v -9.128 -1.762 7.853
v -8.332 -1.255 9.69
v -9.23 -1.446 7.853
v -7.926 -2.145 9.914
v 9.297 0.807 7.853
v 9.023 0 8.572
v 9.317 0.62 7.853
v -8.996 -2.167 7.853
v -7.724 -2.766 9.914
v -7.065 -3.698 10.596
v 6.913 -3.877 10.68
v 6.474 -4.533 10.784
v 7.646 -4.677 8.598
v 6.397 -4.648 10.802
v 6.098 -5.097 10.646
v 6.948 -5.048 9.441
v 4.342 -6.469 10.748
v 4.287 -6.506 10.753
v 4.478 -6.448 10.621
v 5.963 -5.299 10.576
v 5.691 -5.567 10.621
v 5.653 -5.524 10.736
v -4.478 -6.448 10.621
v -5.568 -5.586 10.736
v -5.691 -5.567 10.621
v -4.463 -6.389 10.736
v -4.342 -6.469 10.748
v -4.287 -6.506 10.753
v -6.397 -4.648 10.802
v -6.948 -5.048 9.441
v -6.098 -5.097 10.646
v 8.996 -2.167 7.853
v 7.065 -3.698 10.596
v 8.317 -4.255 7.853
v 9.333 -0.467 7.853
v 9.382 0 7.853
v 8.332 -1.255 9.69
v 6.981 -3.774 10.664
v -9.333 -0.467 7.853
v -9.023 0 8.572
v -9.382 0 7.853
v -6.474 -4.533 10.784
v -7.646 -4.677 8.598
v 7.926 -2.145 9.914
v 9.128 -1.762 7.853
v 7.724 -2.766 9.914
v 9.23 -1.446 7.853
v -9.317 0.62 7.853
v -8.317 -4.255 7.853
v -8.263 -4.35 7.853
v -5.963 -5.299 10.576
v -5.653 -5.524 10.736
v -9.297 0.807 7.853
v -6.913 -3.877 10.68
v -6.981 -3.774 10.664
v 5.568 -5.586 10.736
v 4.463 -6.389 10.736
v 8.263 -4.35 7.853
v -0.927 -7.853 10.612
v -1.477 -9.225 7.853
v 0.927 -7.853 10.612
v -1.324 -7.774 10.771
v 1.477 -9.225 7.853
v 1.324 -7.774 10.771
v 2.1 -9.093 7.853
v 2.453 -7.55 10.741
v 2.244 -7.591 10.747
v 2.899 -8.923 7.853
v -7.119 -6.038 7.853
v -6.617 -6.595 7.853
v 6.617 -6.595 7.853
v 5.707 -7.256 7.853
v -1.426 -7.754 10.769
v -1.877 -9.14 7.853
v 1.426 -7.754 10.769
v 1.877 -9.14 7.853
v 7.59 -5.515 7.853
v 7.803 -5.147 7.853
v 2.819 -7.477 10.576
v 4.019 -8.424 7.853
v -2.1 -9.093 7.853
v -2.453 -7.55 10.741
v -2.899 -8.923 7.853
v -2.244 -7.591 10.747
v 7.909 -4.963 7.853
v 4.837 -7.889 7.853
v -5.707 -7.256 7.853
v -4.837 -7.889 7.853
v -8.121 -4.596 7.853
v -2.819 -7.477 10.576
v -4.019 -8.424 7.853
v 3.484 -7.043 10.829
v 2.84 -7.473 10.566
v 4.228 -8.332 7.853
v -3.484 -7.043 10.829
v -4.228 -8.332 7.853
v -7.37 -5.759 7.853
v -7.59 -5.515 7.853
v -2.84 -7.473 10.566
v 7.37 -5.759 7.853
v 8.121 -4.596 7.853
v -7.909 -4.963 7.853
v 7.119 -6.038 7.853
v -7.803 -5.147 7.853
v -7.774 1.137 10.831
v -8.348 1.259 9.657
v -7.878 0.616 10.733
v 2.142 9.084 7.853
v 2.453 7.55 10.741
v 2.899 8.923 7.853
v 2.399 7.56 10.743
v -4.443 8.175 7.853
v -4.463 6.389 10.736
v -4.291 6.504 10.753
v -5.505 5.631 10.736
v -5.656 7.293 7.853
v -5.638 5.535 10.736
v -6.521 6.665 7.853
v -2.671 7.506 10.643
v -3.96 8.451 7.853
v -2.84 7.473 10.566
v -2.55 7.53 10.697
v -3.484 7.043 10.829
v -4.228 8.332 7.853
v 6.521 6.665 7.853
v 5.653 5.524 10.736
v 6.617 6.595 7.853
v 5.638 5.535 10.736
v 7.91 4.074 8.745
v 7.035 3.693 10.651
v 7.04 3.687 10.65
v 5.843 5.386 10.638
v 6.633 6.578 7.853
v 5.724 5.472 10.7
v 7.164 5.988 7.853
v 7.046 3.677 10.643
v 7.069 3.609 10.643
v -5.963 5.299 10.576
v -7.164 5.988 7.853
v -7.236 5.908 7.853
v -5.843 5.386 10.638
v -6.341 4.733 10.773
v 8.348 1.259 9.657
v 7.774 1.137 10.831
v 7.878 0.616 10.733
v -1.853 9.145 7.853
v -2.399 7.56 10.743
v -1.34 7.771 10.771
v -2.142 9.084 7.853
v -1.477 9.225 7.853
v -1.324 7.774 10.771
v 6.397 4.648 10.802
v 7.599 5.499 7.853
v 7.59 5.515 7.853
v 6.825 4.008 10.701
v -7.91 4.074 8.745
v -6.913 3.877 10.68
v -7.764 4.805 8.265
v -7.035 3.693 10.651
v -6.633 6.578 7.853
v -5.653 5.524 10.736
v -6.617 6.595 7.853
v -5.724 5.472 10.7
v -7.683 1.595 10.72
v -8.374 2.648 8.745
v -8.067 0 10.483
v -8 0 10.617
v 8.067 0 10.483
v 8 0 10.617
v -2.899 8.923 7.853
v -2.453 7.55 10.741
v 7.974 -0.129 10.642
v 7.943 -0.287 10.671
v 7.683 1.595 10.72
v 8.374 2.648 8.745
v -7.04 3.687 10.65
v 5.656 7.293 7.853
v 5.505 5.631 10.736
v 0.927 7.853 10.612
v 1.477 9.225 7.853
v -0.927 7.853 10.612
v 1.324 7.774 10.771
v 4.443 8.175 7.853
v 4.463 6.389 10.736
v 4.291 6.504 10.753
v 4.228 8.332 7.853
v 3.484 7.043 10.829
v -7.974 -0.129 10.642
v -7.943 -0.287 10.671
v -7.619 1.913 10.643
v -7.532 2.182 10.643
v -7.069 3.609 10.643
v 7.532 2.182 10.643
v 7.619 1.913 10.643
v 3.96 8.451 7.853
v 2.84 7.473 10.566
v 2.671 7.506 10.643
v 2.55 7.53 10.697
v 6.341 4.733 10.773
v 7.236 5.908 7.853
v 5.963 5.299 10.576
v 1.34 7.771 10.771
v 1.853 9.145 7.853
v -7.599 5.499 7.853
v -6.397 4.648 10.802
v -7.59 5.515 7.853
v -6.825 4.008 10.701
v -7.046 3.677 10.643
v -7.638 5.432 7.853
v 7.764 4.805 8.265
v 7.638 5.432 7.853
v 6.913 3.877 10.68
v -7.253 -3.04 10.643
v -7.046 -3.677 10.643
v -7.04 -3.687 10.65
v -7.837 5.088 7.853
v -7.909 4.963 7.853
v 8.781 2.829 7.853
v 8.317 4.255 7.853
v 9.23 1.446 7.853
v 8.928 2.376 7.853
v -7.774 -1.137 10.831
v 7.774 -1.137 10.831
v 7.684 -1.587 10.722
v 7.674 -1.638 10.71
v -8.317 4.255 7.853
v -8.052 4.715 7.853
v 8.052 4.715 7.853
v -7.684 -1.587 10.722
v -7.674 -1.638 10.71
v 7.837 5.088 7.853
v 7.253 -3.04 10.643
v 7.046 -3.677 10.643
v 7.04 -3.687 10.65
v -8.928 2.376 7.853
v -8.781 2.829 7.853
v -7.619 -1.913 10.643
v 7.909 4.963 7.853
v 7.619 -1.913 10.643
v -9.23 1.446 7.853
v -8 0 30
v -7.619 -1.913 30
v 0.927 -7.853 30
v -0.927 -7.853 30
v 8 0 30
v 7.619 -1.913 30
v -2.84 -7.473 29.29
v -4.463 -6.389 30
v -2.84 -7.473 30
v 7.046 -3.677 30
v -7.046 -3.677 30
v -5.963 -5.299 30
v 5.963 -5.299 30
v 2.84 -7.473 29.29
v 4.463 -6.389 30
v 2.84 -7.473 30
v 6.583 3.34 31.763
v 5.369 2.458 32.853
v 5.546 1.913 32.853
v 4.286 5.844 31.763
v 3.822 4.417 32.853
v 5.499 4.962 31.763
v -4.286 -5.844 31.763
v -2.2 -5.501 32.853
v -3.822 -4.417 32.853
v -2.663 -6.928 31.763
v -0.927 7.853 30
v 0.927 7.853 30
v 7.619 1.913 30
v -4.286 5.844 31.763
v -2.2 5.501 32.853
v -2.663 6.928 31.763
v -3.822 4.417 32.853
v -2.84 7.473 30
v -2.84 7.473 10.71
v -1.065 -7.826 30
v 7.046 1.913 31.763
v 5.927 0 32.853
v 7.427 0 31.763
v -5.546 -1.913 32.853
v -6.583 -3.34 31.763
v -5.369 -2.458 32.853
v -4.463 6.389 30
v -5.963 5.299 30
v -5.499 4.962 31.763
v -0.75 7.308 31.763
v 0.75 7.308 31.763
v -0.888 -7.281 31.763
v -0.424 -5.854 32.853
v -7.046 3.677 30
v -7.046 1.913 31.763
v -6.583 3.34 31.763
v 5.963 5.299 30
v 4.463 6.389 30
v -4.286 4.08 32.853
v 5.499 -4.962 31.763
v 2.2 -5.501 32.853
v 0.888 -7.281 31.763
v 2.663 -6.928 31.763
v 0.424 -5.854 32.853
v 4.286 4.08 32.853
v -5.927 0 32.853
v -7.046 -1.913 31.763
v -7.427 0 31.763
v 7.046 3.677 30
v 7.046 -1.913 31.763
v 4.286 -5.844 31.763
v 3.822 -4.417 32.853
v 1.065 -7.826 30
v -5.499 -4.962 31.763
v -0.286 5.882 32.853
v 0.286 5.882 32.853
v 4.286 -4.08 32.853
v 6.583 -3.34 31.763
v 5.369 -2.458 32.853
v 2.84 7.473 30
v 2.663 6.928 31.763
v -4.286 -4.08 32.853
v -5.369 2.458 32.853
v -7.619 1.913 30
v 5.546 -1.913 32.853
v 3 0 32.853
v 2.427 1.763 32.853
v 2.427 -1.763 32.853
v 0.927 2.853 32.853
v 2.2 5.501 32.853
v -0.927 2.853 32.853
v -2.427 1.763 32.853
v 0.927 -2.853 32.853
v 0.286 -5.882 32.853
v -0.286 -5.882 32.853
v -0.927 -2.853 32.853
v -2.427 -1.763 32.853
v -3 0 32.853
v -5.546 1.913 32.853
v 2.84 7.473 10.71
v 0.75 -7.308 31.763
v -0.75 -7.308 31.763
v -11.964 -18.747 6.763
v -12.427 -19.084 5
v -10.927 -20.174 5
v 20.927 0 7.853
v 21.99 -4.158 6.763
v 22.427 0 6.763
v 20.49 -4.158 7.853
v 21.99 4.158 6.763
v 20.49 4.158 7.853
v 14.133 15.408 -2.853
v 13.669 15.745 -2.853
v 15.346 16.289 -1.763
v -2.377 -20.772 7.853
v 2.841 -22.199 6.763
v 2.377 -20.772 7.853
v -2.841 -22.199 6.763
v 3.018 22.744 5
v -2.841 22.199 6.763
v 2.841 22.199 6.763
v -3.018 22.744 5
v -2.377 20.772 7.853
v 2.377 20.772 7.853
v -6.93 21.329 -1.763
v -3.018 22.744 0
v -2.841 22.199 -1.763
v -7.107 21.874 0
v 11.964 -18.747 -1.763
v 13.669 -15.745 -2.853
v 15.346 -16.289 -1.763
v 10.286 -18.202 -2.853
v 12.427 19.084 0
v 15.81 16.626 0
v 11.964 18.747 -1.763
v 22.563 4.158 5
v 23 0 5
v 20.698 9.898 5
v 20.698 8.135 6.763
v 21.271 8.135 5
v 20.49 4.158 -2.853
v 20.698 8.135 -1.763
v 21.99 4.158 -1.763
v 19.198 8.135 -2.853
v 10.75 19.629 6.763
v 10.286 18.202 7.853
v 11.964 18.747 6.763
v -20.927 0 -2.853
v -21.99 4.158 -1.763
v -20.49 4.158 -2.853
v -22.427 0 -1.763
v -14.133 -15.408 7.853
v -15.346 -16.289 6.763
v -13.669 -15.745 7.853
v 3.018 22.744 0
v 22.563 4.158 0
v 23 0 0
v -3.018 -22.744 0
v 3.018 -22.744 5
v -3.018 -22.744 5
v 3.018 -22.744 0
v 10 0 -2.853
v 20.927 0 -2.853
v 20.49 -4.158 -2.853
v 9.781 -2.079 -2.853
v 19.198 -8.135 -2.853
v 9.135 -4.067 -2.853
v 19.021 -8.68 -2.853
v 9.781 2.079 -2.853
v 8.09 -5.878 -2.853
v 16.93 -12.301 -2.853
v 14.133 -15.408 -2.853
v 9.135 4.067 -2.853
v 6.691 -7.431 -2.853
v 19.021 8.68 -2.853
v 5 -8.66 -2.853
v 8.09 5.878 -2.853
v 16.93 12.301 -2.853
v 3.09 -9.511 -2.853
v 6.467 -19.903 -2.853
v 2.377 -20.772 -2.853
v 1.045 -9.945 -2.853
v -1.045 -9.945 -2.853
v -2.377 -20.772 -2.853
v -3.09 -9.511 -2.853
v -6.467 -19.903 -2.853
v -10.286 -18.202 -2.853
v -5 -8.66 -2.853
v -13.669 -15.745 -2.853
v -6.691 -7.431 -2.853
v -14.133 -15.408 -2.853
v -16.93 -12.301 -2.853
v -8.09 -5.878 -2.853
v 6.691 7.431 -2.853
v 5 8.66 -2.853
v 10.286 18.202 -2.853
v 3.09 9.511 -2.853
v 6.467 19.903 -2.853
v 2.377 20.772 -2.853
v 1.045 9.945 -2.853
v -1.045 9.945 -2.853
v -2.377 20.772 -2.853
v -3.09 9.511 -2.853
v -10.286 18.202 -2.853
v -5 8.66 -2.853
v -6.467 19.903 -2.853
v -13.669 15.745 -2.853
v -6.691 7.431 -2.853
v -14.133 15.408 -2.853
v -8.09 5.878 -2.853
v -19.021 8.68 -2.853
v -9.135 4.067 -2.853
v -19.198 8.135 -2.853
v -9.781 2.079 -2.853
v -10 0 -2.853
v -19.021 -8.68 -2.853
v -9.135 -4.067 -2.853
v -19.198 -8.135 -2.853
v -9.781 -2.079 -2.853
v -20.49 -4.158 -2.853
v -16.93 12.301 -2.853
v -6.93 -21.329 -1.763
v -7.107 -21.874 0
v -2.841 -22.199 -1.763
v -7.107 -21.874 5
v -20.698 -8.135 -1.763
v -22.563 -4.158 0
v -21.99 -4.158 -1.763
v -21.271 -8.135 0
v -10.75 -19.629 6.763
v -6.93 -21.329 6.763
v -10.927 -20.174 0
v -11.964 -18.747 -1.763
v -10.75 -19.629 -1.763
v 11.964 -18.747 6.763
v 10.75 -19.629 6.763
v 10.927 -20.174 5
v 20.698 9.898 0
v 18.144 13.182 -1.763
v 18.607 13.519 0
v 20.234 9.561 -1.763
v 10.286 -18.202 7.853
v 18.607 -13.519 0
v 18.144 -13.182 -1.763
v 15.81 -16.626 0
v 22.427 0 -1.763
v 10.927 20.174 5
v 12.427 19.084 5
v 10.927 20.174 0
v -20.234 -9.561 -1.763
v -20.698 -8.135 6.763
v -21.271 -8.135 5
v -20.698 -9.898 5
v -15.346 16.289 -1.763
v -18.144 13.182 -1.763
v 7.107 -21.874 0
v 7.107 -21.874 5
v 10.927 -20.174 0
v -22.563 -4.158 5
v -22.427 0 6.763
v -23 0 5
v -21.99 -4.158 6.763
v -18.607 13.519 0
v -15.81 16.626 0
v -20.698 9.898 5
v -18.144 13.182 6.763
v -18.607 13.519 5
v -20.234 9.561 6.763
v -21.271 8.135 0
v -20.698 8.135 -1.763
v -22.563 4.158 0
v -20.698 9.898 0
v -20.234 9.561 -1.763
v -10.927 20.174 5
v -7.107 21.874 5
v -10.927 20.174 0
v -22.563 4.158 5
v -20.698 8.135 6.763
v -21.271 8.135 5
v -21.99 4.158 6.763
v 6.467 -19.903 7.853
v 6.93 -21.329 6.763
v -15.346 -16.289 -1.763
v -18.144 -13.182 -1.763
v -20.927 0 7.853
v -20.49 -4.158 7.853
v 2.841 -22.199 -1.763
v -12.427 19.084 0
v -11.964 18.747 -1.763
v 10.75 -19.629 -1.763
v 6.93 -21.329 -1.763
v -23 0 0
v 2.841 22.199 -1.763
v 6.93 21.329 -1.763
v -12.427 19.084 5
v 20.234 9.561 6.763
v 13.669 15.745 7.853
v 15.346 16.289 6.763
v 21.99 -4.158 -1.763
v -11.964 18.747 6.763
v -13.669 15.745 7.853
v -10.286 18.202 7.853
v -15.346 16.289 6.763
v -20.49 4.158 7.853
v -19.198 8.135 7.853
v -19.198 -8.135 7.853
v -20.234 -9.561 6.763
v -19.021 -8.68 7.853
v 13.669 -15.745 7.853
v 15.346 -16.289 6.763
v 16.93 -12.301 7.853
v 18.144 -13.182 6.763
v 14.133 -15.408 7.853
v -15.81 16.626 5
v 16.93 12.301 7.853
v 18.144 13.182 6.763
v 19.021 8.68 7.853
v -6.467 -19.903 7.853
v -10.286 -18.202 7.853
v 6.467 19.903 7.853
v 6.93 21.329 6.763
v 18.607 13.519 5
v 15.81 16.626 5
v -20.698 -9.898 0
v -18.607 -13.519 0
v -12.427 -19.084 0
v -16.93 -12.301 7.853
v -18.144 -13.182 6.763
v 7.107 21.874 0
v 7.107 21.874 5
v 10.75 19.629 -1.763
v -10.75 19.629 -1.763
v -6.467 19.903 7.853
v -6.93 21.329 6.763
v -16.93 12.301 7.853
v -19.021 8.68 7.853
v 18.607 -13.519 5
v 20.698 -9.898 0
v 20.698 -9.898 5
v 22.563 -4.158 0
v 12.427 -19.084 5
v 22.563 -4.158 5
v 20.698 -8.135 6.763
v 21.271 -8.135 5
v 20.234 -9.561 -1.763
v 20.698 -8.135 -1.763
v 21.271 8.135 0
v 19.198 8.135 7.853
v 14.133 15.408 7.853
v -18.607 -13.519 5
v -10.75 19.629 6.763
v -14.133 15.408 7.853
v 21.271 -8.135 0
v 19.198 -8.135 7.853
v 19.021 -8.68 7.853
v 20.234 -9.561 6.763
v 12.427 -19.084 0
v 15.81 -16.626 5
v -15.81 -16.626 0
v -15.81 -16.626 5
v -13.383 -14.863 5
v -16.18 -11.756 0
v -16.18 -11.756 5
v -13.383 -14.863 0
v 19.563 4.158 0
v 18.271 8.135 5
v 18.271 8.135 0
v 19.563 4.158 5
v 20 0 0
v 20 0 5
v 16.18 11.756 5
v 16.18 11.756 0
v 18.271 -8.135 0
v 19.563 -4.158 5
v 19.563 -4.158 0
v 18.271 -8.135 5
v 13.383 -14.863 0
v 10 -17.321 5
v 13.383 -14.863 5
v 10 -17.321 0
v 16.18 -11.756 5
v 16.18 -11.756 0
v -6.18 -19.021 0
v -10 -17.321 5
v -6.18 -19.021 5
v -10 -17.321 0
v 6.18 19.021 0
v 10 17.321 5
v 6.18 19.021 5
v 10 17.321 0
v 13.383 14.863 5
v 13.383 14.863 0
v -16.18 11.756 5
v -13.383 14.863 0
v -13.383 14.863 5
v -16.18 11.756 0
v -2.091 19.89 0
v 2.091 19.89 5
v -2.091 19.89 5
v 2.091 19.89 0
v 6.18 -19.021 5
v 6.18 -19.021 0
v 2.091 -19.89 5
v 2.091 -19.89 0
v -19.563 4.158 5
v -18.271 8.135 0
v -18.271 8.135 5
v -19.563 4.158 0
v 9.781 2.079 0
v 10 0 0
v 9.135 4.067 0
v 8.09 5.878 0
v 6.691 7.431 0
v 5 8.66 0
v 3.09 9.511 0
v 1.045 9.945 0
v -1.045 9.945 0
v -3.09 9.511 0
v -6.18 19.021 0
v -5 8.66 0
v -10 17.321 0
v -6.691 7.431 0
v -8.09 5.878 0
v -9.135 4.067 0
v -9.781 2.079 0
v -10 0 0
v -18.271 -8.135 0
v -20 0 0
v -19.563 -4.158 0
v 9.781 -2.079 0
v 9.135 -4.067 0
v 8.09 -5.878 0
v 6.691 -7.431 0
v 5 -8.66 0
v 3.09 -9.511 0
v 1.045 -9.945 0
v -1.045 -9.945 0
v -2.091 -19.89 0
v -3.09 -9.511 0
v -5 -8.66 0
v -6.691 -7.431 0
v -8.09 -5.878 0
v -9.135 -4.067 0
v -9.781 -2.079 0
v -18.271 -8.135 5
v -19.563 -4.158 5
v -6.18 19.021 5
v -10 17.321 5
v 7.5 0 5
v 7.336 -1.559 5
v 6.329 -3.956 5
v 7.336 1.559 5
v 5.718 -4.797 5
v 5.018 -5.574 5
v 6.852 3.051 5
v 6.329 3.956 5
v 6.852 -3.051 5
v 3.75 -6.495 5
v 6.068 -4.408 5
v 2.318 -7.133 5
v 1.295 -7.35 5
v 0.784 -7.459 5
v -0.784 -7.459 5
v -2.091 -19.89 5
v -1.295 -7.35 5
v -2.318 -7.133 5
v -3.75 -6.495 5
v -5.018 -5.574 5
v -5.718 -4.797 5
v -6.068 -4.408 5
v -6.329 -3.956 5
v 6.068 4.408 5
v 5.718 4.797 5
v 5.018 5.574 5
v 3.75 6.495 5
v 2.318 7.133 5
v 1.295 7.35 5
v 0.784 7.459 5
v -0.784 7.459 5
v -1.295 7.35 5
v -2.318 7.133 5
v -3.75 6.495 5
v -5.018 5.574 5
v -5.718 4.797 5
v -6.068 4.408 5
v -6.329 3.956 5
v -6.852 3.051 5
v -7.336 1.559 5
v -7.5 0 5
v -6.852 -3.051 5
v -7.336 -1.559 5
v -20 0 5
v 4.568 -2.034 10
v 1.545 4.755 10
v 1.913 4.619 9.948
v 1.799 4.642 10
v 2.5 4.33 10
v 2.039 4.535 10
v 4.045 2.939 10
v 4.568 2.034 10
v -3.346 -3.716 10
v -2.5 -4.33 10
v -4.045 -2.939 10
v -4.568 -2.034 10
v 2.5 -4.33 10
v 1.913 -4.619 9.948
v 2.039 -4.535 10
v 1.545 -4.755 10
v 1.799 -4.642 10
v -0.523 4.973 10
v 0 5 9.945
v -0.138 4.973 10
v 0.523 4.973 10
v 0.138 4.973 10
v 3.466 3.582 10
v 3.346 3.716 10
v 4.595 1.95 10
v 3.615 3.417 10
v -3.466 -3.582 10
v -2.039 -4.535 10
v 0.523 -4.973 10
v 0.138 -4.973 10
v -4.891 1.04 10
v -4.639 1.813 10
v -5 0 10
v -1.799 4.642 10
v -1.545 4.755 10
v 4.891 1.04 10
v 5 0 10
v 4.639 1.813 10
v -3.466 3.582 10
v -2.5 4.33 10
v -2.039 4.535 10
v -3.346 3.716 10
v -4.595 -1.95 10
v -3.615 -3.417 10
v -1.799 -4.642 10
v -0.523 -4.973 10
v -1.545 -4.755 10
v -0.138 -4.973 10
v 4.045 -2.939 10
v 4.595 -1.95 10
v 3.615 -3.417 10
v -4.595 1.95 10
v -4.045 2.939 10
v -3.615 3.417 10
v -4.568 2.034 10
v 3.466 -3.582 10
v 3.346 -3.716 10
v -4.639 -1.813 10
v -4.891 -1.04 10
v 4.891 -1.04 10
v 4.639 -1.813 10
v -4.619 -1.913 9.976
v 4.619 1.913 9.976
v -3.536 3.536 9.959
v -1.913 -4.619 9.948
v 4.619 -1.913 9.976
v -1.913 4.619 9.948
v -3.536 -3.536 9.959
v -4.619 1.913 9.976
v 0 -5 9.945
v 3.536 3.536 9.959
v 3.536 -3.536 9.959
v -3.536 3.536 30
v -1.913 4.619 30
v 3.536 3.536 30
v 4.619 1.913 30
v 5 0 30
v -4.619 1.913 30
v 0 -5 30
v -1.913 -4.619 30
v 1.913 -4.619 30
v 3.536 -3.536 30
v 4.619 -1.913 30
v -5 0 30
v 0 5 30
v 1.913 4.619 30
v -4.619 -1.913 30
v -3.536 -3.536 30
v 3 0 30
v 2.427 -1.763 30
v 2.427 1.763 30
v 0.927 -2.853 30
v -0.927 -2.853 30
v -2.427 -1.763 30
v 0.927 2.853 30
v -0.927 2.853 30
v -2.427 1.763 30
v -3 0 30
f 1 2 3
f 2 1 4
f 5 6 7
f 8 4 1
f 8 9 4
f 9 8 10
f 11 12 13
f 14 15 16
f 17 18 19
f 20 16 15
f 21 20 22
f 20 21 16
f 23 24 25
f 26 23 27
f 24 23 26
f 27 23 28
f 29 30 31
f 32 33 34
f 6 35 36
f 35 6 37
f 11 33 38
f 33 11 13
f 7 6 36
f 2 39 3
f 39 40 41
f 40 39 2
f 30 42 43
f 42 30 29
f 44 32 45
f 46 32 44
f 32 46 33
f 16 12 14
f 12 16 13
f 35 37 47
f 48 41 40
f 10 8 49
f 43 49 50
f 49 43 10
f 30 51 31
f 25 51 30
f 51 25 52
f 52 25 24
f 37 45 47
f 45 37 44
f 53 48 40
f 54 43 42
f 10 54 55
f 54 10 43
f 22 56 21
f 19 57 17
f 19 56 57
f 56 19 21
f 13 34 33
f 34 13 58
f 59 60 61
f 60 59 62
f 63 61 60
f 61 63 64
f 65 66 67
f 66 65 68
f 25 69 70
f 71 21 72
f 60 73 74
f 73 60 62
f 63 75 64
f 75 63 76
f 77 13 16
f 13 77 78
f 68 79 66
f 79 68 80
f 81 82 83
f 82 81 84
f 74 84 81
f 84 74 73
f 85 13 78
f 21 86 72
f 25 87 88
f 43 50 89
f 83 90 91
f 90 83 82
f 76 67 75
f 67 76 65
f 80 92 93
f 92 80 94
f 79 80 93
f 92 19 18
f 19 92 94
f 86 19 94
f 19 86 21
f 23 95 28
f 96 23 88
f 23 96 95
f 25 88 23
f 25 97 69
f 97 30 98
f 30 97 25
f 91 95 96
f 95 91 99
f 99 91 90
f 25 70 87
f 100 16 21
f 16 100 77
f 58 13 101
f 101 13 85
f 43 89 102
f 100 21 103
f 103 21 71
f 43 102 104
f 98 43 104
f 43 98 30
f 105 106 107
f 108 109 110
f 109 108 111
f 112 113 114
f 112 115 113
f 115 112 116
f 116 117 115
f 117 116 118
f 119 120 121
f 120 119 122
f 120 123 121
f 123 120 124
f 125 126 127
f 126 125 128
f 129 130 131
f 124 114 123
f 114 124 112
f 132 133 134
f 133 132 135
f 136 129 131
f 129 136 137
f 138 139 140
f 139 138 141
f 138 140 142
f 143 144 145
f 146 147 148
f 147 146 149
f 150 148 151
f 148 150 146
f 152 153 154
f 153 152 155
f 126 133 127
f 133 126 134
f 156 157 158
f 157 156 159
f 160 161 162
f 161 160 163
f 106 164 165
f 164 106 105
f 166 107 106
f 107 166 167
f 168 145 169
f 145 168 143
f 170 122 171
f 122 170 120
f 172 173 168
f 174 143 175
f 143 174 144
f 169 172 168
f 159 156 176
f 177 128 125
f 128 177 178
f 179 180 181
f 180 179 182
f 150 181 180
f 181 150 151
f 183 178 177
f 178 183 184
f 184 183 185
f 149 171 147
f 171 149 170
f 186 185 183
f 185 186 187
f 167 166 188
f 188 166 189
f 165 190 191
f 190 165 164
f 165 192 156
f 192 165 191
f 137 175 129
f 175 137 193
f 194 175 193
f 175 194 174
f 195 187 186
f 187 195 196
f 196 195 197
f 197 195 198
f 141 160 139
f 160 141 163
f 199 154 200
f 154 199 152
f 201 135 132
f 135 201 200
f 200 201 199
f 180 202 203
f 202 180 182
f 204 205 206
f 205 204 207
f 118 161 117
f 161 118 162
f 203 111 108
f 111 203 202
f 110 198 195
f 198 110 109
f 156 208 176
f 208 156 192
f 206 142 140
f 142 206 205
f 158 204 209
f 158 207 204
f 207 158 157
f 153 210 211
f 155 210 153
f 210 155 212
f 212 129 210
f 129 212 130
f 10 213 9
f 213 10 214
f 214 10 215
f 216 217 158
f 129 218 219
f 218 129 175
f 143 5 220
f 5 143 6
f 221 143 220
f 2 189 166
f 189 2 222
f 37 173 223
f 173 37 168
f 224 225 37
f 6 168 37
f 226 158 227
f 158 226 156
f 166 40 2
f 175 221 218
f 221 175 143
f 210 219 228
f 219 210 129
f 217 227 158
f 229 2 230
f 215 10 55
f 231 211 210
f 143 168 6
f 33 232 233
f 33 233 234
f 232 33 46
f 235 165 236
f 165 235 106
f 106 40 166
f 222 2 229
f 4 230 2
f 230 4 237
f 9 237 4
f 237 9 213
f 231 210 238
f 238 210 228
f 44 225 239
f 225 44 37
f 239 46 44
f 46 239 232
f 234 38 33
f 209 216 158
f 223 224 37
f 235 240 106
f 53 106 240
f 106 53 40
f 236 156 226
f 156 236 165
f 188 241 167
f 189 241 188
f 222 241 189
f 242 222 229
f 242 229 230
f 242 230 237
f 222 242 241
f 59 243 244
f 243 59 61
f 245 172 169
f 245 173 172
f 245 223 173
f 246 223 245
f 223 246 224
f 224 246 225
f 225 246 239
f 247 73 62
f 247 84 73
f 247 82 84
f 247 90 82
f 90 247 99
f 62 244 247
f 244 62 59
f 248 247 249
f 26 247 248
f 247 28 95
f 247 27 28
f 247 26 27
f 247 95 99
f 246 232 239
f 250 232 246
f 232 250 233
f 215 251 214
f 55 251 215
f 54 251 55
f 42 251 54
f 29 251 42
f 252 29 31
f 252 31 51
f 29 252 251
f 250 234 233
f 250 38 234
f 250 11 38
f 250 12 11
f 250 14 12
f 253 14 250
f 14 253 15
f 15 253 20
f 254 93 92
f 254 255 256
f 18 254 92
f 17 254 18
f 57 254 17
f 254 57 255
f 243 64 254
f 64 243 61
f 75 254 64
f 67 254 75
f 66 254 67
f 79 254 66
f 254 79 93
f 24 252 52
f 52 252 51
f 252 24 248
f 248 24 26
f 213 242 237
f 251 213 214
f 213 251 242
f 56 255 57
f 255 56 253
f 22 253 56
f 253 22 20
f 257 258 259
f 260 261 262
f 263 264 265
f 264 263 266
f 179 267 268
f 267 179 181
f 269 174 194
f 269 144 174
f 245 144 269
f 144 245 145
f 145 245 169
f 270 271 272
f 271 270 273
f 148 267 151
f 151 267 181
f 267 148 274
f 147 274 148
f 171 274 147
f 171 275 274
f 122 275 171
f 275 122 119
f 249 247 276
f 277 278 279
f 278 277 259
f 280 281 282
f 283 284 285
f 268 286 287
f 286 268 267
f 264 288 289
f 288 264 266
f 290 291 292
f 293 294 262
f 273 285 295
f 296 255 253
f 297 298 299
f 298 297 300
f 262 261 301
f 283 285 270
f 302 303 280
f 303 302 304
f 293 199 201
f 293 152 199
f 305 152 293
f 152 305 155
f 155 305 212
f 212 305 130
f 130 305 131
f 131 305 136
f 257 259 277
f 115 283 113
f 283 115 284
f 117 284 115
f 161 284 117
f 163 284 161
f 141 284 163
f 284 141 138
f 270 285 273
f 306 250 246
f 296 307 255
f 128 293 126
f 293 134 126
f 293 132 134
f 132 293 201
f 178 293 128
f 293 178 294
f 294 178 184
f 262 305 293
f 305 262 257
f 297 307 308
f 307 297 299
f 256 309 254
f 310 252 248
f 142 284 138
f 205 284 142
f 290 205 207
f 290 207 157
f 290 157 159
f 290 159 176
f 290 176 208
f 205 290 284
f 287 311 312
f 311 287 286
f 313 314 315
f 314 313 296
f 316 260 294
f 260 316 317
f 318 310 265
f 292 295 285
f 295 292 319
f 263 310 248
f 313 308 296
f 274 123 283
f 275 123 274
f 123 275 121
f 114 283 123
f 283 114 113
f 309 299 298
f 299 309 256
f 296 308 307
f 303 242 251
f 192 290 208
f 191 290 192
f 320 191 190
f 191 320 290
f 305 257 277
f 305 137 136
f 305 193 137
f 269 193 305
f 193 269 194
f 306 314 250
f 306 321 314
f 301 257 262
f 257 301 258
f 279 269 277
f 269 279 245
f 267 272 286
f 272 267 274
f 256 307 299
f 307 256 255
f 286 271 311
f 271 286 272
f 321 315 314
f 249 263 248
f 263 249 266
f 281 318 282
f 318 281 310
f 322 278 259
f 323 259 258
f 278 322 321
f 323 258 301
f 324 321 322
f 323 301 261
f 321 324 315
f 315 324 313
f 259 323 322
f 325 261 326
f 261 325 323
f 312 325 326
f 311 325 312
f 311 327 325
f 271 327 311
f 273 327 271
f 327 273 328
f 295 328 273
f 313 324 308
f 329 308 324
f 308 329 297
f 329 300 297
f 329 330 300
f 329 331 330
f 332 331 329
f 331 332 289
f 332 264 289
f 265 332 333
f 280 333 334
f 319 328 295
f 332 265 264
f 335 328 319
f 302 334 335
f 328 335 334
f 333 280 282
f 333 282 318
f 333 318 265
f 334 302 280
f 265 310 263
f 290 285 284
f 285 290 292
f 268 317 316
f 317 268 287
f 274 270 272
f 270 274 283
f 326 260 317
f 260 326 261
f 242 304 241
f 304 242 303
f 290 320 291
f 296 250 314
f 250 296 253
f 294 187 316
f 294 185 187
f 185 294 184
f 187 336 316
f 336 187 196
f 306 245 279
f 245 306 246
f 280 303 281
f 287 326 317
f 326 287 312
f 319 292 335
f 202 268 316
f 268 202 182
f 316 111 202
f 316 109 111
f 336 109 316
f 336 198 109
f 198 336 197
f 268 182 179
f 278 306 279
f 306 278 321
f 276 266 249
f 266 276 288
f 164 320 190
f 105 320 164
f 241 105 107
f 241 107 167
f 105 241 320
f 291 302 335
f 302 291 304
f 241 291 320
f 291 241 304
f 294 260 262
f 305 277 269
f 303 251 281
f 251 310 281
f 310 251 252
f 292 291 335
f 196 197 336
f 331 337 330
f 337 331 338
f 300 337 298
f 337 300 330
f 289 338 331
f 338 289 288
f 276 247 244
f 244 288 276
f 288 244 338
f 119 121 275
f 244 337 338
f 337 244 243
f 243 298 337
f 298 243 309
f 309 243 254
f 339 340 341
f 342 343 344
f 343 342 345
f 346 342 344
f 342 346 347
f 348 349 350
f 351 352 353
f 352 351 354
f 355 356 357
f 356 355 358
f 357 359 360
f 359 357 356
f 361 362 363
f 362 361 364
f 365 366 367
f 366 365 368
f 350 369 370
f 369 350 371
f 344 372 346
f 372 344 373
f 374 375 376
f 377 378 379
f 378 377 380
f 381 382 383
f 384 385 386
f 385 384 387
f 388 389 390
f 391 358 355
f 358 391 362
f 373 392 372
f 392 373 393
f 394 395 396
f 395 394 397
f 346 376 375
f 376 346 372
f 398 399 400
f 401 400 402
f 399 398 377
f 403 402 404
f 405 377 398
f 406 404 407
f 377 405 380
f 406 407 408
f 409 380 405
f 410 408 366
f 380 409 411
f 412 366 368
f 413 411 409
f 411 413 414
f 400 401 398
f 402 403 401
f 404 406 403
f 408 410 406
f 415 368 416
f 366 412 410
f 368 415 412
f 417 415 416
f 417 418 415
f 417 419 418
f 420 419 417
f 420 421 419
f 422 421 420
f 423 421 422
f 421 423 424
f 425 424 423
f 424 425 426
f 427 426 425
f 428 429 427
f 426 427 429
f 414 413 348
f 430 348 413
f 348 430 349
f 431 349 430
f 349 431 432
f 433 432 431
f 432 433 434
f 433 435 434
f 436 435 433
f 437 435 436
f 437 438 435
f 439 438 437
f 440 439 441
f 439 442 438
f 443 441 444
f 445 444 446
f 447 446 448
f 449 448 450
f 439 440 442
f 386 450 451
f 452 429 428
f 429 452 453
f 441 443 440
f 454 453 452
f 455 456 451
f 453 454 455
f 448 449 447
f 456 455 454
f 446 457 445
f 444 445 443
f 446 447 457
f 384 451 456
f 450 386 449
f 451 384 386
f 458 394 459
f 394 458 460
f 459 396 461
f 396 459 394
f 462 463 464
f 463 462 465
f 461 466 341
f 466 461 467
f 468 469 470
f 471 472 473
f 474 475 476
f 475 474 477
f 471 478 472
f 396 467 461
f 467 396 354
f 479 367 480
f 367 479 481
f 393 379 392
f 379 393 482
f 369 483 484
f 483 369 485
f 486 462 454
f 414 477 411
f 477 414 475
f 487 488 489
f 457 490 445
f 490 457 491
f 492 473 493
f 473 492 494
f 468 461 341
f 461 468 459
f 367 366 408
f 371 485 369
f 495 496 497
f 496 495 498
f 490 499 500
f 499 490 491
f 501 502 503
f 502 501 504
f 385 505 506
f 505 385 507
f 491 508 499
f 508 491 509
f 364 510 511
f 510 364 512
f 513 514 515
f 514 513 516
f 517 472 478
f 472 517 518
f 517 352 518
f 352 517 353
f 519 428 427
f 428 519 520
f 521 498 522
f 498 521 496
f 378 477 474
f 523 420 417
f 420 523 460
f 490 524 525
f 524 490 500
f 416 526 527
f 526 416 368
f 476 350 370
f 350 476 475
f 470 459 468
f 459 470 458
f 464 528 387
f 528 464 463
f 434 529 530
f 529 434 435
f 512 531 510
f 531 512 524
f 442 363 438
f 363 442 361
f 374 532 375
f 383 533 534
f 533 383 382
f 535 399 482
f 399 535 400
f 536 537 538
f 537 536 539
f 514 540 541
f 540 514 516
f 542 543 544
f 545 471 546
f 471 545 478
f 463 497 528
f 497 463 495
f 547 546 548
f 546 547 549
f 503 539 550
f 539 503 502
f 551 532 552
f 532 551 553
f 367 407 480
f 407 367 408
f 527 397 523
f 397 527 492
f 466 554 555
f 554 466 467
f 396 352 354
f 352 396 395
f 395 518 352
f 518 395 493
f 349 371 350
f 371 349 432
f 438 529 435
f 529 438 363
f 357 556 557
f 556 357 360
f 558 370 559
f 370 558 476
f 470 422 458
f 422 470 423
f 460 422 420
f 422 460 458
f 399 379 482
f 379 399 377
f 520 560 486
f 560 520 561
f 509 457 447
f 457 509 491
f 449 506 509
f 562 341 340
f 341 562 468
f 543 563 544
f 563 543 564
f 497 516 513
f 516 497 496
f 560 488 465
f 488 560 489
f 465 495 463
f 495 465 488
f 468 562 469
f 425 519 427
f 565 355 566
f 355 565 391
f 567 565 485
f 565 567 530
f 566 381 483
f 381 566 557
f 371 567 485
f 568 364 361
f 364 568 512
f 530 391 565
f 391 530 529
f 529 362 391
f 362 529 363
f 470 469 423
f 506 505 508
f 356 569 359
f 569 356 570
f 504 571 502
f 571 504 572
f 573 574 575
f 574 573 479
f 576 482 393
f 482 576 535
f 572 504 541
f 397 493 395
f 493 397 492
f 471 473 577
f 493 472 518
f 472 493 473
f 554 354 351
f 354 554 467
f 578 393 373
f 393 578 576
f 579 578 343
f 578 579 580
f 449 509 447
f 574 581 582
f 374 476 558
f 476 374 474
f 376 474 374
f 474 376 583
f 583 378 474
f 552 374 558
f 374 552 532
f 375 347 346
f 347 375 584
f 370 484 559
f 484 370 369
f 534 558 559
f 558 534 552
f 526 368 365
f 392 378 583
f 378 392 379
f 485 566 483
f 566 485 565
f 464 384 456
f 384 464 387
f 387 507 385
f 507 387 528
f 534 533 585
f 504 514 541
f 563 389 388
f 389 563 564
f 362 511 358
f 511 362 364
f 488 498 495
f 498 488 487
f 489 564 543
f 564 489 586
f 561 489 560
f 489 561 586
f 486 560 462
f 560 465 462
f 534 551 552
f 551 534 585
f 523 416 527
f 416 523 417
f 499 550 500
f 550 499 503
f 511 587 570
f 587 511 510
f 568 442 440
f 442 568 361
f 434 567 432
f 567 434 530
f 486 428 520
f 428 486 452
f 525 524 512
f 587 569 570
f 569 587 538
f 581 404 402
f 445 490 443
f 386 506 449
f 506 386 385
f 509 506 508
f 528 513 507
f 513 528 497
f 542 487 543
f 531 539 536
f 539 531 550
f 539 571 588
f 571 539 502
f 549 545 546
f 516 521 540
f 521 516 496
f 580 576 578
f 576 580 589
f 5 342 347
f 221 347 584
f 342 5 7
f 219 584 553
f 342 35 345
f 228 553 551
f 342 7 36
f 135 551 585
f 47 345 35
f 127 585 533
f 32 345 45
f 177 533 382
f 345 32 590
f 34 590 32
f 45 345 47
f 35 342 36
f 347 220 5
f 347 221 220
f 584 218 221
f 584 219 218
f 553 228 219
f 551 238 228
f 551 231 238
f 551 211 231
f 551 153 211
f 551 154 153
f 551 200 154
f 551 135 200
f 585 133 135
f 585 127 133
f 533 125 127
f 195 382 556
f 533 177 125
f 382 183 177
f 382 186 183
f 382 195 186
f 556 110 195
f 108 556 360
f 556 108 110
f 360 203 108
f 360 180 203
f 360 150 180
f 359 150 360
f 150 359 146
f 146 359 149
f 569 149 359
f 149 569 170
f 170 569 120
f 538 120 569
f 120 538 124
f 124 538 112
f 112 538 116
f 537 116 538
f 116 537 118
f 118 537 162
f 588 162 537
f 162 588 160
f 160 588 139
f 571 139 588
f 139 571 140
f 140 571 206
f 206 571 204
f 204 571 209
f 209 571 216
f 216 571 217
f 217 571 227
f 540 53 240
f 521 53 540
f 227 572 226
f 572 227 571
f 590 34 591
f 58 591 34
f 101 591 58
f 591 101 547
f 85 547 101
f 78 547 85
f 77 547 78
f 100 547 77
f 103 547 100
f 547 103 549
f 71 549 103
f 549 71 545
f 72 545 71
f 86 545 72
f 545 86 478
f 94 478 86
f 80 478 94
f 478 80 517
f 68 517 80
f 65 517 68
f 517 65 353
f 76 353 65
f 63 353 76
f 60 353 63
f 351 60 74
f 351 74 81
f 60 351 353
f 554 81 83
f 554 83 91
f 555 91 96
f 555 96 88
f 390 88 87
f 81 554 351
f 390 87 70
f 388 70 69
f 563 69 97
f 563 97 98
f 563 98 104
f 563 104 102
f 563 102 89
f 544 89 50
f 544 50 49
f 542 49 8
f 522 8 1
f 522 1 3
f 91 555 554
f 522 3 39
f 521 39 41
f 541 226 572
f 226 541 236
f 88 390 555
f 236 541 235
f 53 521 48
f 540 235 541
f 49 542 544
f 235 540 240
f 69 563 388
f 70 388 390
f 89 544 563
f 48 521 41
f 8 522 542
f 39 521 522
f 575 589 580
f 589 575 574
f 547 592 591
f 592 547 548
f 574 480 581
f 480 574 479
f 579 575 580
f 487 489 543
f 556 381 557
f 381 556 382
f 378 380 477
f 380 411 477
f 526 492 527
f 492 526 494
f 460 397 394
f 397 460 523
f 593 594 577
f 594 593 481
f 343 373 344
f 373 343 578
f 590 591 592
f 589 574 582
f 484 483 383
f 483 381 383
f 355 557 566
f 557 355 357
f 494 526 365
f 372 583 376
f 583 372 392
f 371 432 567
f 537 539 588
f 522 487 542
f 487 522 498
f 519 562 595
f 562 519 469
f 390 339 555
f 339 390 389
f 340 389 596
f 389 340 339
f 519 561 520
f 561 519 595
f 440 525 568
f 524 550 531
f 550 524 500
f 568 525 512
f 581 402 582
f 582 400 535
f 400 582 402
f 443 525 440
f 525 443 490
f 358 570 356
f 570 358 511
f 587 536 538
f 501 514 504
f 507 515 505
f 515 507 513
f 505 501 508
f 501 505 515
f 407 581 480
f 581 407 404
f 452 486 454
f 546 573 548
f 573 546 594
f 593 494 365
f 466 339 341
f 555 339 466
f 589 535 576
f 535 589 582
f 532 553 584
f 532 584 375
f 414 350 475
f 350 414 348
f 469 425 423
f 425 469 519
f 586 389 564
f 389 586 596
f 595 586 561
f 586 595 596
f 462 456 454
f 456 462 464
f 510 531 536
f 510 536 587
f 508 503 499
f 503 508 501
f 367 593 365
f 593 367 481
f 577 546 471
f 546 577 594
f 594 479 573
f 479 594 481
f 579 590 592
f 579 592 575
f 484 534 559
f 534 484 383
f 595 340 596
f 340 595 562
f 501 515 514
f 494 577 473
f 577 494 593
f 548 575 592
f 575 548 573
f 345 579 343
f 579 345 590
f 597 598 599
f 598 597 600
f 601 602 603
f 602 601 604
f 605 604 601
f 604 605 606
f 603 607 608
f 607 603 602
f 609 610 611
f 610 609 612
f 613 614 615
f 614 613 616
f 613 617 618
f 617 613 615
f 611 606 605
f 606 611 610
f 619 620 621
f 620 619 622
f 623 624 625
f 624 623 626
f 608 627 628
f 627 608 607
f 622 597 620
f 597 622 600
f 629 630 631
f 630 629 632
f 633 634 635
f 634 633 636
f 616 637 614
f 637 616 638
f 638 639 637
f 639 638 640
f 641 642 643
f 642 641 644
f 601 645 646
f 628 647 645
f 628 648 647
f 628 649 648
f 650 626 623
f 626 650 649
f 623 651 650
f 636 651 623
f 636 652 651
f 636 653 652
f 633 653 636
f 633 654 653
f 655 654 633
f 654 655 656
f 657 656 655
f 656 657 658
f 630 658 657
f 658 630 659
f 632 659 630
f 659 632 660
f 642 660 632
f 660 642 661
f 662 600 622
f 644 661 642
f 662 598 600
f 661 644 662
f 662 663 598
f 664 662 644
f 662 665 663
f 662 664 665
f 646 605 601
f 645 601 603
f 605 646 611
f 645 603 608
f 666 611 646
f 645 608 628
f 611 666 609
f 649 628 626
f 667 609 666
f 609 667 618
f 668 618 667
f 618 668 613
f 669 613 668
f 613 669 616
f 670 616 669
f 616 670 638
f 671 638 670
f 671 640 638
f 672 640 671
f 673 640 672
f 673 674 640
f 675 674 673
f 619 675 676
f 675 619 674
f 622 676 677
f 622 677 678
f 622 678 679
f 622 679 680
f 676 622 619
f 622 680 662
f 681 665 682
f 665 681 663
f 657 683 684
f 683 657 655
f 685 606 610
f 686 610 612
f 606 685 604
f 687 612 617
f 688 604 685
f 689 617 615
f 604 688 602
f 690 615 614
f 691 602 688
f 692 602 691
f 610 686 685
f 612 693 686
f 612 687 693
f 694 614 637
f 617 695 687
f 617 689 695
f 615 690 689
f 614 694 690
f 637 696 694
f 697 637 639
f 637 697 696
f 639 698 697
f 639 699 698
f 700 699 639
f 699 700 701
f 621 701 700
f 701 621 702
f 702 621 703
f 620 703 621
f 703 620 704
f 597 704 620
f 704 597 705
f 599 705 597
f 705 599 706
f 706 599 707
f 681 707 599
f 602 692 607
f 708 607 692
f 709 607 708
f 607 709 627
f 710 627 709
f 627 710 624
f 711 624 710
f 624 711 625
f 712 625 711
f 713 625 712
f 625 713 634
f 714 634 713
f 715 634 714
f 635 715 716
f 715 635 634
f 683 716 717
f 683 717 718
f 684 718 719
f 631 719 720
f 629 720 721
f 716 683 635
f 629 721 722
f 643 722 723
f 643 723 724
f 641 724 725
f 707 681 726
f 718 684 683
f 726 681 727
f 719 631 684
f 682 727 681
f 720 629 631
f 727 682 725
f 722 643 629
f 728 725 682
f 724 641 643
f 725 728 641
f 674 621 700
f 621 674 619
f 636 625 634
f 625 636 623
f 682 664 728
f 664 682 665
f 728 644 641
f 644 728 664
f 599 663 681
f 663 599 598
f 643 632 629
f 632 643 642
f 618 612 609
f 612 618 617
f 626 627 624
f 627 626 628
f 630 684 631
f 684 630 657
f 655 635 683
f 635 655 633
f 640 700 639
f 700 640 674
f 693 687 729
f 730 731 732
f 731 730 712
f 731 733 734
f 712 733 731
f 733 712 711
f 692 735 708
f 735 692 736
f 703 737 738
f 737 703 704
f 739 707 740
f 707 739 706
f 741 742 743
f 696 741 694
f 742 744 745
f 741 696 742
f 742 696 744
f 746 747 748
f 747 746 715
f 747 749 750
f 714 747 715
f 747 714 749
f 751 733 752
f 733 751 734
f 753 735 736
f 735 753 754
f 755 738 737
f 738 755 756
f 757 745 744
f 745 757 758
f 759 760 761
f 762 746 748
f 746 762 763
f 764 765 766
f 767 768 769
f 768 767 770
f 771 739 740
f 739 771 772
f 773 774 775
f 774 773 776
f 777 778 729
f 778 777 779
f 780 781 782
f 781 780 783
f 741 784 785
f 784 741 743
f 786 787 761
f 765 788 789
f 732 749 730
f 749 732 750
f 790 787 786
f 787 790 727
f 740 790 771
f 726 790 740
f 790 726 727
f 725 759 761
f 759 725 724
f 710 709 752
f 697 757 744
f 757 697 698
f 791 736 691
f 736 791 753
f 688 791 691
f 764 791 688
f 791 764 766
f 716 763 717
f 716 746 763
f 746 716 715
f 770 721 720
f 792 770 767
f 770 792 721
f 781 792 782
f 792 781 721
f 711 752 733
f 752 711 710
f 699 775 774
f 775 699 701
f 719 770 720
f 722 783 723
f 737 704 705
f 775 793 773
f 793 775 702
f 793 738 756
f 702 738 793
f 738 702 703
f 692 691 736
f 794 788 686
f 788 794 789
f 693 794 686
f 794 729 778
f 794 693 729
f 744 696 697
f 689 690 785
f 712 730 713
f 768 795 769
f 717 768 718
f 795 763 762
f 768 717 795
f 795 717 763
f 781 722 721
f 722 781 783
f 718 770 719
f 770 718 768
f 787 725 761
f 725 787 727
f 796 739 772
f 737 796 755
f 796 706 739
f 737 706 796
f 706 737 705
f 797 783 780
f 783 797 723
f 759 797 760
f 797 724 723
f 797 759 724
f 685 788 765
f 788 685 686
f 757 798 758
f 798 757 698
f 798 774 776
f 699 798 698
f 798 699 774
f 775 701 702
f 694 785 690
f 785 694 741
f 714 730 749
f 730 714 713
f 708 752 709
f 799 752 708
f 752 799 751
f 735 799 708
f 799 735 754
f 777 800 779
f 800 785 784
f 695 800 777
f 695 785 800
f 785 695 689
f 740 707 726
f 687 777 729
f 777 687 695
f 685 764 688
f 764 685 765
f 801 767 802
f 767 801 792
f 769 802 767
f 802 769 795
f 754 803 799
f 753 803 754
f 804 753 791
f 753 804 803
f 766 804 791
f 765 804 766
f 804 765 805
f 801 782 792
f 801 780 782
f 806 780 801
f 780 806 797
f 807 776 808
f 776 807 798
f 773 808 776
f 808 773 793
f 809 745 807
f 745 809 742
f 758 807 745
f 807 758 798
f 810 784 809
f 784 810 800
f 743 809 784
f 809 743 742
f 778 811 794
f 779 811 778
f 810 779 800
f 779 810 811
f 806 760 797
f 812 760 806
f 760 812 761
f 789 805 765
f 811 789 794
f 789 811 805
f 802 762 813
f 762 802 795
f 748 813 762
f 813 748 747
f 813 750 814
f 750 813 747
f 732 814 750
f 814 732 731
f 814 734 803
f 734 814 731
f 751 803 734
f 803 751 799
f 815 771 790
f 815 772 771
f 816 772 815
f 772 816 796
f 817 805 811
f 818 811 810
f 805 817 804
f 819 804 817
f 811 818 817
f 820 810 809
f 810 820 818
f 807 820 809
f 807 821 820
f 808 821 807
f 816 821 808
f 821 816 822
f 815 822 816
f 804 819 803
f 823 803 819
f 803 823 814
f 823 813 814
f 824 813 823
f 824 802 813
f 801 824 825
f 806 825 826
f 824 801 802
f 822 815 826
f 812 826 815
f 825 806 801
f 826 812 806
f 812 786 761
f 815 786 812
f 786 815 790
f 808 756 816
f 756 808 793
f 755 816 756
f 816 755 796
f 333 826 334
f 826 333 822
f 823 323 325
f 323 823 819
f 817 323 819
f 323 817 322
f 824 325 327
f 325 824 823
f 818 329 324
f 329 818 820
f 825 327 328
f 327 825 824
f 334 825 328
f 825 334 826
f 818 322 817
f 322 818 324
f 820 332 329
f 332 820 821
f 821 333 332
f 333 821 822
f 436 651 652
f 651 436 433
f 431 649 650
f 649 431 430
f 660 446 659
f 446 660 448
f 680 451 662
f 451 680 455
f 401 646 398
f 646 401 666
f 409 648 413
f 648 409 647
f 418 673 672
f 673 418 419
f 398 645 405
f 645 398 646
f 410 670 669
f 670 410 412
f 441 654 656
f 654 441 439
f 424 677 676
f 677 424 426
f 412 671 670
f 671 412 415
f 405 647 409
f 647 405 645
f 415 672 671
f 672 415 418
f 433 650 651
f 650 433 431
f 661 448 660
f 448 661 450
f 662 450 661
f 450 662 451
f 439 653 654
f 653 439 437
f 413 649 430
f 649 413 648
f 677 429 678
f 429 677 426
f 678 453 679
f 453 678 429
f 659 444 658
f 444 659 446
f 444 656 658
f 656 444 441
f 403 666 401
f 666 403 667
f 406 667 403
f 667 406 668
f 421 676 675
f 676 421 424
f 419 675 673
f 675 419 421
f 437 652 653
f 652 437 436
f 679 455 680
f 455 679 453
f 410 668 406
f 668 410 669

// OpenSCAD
difference() {
    minkowski(){
        sphere(r=3);
        shaft();
        }
    scale(f=1.1)shaft();
    translate([0,0,-10]) cylinder(r=3, h=50);
    translate([0,0,-10]) cylinder(r=10, h=15);
        
    }

module shaft() {
union() {
    cylinder(r=20,h=5);
    cylinder(r1=10,r2=5,h=10);
    cylinder(r=5,h=30);
    }
}
